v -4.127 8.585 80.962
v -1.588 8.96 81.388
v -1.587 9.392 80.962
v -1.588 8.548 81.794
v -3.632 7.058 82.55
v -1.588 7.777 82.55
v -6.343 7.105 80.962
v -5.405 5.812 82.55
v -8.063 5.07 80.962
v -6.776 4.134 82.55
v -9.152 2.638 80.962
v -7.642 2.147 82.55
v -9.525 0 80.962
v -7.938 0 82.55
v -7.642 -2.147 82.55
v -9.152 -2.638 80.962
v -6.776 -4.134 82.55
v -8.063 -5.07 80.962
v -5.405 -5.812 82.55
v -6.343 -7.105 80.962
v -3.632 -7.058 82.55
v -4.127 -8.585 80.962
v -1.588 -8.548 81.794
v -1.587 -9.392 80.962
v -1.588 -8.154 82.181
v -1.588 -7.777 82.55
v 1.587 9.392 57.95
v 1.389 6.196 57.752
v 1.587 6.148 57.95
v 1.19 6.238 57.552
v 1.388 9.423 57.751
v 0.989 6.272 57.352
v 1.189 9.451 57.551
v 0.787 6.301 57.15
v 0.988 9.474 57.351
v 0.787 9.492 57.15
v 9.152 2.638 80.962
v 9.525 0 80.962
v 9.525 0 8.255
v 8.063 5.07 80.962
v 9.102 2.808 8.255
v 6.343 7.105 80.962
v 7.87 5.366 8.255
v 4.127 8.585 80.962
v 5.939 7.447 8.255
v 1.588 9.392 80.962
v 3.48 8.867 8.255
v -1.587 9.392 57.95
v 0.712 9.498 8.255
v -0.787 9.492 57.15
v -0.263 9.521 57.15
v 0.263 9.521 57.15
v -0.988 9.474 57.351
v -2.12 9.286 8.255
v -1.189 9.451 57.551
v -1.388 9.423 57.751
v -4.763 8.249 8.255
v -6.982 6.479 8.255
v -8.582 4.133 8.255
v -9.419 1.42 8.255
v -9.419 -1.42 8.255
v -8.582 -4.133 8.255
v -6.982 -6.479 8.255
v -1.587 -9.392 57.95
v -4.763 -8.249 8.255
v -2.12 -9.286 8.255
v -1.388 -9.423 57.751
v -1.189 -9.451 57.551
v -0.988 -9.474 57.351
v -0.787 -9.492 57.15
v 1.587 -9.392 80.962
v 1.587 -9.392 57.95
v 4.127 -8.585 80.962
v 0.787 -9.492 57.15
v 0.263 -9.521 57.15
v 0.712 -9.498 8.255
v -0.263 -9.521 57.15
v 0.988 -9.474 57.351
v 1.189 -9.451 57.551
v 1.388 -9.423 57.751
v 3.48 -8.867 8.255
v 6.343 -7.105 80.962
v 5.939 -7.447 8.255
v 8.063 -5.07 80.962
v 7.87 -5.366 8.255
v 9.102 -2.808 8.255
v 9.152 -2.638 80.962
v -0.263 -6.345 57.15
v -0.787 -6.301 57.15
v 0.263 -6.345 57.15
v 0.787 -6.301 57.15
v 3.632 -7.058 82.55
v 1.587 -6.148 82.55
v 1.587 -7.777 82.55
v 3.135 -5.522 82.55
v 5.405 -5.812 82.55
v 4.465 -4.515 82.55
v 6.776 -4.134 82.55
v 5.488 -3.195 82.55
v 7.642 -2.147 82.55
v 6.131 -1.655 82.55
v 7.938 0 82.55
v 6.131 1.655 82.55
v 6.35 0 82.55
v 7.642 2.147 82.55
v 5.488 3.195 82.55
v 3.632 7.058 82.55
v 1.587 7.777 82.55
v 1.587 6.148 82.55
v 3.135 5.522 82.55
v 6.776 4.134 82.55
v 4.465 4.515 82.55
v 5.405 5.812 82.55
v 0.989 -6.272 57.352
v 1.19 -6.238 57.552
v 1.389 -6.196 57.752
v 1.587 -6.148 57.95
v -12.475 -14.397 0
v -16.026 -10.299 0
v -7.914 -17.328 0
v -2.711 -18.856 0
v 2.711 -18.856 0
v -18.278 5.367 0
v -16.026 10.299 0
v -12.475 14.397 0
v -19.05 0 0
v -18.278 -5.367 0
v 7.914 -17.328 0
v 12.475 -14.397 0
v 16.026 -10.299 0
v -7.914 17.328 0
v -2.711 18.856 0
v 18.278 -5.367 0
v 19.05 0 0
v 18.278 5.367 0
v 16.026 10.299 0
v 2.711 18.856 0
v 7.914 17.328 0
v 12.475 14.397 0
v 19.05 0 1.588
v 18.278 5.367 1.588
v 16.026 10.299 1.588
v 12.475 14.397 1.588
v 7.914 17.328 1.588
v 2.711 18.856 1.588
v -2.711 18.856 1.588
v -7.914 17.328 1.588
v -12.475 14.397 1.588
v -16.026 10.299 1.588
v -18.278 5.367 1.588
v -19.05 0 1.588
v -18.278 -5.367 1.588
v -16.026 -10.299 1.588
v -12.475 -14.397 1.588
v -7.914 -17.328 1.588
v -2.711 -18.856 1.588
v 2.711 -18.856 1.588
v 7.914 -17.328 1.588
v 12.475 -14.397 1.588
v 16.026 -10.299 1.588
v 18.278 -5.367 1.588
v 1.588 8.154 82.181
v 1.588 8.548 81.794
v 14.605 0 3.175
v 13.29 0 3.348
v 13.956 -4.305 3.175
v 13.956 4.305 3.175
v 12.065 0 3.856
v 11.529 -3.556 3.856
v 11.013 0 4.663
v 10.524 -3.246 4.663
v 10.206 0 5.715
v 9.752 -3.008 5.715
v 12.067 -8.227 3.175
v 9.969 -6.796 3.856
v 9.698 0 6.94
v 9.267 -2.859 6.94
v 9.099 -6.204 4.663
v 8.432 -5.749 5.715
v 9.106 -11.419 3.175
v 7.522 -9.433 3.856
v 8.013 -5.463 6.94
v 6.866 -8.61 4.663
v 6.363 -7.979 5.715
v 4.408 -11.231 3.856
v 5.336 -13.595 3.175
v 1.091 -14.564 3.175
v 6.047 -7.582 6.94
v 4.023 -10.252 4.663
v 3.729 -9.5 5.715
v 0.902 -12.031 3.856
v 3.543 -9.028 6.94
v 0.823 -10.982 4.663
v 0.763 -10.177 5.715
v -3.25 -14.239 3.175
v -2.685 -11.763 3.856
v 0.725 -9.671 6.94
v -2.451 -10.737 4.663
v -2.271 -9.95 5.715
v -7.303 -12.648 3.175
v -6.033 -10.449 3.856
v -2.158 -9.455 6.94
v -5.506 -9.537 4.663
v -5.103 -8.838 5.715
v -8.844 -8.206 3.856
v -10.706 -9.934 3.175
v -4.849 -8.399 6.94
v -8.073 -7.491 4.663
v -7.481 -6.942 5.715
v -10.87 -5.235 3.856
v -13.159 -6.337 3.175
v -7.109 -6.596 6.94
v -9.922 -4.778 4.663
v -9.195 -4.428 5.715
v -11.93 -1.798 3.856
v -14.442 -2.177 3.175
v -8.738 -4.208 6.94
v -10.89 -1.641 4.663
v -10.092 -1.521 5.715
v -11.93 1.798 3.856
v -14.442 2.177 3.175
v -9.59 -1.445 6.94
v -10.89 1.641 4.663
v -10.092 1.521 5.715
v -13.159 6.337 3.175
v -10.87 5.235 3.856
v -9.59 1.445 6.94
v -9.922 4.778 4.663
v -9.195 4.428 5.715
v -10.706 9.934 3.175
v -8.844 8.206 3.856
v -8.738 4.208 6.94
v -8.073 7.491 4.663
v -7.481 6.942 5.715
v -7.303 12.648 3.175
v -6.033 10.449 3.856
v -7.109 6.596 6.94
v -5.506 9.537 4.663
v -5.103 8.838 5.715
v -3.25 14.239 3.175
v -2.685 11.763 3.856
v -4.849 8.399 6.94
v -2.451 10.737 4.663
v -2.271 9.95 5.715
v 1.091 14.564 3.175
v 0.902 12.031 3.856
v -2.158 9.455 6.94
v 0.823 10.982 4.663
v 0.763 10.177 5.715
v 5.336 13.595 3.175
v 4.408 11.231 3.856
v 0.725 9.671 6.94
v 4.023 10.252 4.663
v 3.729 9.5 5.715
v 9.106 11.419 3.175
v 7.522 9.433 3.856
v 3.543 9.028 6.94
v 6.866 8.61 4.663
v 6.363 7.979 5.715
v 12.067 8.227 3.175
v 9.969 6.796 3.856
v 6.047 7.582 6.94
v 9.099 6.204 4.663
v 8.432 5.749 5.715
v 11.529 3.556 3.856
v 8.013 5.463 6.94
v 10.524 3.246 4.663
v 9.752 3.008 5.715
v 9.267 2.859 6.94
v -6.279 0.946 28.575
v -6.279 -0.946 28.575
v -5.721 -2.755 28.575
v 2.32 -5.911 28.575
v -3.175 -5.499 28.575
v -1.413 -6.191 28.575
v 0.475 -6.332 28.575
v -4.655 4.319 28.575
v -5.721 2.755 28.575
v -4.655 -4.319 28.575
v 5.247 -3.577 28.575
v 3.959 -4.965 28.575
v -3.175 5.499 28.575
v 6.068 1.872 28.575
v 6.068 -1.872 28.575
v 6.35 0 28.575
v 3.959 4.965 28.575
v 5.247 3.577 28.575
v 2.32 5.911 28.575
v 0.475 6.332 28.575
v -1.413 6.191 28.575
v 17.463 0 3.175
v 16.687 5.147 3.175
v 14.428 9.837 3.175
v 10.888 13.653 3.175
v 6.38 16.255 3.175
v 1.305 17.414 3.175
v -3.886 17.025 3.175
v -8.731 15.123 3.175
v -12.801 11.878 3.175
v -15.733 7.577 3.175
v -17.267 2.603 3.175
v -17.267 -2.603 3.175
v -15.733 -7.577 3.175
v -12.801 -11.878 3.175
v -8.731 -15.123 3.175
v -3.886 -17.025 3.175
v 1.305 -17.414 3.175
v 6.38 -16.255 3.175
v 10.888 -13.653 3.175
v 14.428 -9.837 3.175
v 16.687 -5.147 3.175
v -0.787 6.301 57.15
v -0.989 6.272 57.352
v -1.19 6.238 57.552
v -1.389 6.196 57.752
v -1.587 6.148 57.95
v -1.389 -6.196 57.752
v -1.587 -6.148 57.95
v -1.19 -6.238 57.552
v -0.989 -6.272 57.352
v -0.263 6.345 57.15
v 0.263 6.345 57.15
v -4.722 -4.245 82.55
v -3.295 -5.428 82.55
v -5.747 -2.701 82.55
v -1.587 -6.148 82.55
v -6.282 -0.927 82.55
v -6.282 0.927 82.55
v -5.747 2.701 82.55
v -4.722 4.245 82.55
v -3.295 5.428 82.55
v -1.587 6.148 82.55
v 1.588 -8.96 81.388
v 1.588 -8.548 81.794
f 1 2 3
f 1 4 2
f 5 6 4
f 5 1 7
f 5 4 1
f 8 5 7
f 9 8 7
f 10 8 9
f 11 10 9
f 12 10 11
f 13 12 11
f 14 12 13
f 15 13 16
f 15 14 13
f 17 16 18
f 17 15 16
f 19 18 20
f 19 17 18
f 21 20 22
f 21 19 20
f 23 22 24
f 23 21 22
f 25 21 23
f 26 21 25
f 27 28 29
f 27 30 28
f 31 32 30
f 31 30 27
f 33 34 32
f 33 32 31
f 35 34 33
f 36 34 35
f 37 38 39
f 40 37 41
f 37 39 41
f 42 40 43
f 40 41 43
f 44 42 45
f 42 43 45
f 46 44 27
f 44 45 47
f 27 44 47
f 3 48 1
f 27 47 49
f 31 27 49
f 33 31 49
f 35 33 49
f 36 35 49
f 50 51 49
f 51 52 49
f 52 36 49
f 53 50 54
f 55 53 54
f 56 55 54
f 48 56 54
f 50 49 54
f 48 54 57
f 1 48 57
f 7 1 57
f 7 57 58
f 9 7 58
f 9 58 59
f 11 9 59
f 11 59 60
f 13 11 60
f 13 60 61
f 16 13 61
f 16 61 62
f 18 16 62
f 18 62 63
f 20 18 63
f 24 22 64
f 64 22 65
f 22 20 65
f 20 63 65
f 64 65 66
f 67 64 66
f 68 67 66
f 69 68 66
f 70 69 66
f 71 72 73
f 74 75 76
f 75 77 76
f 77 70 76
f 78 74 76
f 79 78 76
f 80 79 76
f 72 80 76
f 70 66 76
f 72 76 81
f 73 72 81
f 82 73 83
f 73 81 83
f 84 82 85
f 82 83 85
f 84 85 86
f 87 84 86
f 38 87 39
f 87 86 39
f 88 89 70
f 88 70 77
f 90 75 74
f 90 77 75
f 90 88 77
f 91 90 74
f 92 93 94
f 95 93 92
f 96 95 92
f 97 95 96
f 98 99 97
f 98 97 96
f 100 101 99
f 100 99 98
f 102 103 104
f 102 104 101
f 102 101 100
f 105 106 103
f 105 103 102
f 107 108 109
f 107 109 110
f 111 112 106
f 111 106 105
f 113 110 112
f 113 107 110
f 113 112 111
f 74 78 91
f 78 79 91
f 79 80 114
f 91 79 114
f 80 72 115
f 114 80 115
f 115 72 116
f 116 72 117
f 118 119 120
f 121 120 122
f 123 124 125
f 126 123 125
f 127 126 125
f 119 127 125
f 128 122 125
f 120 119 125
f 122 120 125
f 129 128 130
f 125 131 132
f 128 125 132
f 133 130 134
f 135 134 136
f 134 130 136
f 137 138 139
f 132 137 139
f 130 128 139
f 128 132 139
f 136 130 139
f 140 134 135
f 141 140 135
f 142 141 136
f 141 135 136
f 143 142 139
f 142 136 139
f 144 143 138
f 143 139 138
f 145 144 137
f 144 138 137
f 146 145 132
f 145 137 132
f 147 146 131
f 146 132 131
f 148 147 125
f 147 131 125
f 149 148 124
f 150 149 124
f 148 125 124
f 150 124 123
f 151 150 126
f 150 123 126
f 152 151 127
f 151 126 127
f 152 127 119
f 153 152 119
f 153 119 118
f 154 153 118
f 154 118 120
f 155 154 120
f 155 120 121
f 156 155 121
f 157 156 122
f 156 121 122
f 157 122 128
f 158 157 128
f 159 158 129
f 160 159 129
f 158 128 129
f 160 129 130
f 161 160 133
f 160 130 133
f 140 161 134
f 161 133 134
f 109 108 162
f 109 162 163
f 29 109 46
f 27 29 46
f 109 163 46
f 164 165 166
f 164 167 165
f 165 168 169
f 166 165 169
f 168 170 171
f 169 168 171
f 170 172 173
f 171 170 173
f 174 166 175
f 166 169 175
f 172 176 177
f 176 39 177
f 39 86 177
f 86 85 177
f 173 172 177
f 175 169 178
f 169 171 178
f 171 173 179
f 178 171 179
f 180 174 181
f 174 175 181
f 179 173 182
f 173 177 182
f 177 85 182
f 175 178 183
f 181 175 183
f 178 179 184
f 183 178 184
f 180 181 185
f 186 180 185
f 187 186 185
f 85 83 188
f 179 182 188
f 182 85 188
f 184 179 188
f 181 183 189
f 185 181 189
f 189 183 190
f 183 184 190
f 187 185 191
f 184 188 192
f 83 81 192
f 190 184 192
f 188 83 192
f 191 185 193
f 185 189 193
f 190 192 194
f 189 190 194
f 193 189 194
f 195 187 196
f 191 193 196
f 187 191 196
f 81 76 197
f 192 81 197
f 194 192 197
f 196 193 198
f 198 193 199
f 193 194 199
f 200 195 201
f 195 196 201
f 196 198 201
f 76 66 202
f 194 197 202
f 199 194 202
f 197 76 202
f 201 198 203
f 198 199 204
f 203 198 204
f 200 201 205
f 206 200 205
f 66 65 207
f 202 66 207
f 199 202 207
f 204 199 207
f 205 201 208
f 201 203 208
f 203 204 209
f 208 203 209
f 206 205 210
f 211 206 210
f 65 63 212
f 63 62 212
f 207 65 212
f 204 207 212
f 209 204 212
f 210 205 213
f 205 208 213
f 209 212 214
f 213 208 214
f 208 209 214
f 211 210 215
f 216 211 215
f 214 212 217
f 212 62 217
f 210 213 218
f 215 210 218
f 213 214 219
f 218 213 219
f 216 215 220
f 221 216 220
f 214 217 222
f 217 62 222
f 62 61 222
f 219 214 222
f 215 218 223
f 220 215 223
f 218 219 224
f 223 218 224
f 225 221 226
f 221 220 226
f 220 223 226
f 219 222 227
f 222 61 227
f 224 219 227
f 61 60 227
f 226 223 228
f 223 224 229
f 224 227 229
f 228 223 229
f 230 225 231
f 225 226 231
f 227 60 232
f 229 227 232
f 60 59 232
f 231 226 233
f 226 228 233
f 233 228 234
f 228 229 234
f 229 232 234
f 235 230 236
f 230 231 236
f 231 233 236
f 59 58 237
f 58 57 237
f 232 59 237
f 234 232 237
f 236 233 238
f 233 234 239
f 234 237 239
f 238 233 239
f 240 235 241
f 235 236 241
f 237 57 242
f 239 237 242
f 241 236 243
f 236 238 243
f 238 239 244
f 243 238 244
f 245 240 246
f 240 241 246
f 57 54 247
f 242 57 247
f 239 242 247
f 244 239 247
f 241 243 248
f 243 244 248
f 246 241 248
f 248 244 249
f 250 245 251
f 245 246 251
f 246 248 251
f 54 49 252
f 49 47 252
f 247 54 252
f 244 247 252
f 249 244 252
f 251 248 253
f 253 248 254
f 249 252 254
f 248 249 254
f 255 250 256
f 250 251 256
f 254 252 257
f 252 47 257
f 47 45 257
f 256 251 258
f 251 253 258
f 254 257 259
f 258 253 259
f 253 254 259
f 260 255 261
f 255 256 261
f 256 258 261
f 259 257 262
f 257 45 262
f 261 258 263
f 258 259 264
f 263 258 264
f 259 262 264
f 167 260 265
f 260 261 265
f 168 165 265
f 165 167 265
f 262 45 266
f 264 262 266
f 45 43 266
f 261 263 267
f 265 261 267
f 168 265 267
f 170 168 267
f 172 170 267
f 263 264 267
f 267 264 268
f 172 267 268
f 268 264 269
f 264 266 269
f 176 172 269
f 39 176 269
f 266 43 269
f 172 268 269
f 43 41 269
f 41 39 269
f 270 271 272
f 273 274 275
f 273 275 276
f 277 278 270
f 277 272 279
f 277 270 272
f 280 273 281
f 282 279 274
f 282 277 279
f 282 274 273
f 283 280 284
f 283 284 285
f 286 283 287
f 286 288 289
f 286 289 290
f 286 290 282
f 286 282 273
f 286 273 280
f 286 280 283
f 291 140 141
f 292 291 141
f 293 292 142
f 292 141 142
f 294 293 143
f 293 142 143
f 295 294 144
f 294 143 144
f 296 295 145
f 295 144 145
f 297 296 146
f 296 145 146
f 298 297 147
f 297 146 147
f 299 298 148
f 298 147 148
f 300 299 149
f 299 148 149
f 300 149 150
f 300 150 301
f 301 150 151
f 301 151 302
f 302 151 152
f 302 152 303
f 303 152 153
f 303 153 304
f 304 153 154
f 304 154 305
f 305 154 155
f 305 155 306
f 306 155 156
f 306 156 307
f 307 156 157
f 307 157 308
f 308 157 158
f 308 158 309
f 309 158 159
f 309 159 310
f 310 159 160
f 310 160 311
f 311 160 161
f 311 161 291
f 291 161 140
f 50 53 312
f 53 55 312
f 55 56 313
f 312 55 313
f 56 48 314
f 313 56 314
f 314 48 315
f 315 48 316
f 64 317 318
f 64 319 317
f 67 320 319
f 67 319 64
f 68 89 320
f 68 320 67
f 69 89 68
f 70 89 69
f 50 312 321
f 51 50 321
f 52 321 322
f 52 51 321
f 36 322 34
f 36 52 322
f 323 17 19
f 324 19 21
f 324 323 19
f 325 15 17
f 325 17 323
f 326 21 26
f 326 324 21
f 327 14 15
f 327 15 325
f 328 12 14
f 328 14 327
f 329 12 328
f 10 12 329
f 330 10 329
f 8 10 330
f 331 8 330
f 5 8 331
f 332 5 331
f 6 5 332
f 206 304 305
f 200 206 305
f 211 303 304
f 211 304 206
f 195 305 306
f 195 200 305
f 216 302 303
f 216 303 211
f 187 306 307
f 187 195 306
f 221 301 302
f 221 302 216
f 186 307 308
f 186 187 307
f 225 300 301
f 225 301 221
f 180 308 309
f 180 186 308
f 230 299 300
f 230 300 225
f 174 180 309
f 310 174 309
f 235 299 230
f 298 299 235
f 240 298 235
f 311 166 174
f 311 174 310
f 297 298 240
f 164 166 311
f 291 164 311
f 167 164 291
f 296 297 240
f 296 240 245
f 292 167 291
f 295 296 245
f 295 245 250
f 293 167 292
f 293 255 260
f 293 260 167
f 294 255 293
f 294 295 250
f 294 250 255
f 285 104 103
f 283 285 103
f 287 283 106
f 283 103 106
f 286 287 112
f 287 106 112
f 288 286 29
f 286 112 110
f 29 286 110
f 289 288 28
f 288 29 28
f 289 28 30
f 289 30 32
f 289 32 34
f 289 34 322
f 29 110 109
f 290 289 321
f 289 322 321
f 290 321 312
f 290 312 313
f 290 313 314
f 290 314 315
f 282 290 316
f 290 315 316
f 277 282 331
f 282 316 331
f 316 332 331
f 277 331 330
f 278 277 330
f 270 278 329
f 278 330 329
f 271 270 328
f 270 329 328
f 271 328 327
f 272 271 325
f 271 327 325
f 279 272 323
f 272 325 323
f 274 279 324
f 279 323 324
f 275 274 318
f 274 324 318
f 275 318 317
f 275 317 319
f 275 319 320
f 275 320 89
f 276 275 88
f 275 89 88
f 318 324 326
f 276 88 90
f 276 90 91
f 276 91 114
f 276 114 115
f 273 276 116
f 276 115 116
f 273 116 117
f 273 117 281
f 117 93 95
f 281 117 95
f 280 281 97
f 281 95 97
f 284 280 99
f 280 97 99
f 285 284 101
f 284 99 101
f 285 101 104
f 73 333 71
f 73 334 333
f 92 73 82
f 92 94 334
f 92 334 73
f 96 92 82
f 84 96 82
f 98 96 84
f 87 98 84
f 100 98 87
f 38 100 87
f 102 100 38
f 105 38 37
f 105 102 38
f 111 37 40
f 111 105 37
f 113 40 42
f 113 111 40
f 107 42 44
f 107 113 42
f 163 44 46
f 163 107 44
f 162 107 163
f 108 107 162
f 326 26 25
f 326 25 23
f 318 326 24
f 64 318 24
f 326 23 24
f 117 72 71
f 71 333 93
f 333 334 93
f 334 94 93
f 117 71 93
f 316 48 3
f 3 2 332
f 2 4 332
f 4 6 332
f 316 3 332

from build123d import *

# Parameters (mm, degrees)
F0_R     = 9.525
F1_DEPTH = 82.55
F2_R     = 19.05
F3_DEPTH = 3.175
F4_R     = 6.35
F5_DEPTH = 53.975
F6_R     = 5.08
F7_SIZE  = 1.5875
F8_W     = 1.5875
F8_H     = 25.4
F9_DEPTH = 25.4
F10_SIZE = 0.8001


with BuildPart() as f1:
    # F0 (on Top) → F1 (new body)
    with BuildSketch(Plane.XY):
        Circle(F0_R)
    extrude(amount=F1_DEPTH)

    # F2 (on Top) → F3 (join)
    with BuildSketch(Plane.XY):
        Circle(F2_R)
    extrude(amount=F3_DEPTH)

    # F4 (on face) → F5 (cut)
    with BuildSketch(Plane.XY.offset(82.55)):
        Circle(F4_R)
    extrude(amount=-F5_DEPTH, mode=Mode.SUBTRACT)

    # F6
    f6_edges = [f1.edges().sort_by_distance(p)[0] for p in [
        (-9.525, 0, 3.175),
    ]]
    fillet(f6_edges, radius=F6_R)

    # F7
    f7_edges = [f1.edges().sort_by_distance(p)[0] for p in [
        (-9.525, 0, 82.55),
        (-19.05, 0, 3.175),
    ]]
    chamfer(f7_edges, length=F7_SIZE)

    # F8 (on face) → F9 (cut)
    with BuildSketch(Plane.XY.offset(82.55)):
        Polygon((1.5875, 0), (0, 0), (0, 25.4), (-1.5875, 25.4), (-1.5875, 0), (-1.5875, -25.4), (0, -25.4), (1.5875, -25.4), align=None)
        with Locations((0.79375, 12.7)):
            Rectangle(F8_W, F8_H)
    extrude(amount=-F9_DEPTH, mode=Mode.SUBTRACT)

    # F10
    f10_edges = [f1.edges().sort_by_distance(p)[0] for p in [
        (1.5875, 7.770069, 57.15),
        (1.5875, -7.770069, 57.15),
        (-1.5875, 7.770069, 57.15),
        (-1.5875, -7.770069, 57.15),
    ]]
    chamfer(f10_edges, length=F10_SIZE)


solid = f1.part
